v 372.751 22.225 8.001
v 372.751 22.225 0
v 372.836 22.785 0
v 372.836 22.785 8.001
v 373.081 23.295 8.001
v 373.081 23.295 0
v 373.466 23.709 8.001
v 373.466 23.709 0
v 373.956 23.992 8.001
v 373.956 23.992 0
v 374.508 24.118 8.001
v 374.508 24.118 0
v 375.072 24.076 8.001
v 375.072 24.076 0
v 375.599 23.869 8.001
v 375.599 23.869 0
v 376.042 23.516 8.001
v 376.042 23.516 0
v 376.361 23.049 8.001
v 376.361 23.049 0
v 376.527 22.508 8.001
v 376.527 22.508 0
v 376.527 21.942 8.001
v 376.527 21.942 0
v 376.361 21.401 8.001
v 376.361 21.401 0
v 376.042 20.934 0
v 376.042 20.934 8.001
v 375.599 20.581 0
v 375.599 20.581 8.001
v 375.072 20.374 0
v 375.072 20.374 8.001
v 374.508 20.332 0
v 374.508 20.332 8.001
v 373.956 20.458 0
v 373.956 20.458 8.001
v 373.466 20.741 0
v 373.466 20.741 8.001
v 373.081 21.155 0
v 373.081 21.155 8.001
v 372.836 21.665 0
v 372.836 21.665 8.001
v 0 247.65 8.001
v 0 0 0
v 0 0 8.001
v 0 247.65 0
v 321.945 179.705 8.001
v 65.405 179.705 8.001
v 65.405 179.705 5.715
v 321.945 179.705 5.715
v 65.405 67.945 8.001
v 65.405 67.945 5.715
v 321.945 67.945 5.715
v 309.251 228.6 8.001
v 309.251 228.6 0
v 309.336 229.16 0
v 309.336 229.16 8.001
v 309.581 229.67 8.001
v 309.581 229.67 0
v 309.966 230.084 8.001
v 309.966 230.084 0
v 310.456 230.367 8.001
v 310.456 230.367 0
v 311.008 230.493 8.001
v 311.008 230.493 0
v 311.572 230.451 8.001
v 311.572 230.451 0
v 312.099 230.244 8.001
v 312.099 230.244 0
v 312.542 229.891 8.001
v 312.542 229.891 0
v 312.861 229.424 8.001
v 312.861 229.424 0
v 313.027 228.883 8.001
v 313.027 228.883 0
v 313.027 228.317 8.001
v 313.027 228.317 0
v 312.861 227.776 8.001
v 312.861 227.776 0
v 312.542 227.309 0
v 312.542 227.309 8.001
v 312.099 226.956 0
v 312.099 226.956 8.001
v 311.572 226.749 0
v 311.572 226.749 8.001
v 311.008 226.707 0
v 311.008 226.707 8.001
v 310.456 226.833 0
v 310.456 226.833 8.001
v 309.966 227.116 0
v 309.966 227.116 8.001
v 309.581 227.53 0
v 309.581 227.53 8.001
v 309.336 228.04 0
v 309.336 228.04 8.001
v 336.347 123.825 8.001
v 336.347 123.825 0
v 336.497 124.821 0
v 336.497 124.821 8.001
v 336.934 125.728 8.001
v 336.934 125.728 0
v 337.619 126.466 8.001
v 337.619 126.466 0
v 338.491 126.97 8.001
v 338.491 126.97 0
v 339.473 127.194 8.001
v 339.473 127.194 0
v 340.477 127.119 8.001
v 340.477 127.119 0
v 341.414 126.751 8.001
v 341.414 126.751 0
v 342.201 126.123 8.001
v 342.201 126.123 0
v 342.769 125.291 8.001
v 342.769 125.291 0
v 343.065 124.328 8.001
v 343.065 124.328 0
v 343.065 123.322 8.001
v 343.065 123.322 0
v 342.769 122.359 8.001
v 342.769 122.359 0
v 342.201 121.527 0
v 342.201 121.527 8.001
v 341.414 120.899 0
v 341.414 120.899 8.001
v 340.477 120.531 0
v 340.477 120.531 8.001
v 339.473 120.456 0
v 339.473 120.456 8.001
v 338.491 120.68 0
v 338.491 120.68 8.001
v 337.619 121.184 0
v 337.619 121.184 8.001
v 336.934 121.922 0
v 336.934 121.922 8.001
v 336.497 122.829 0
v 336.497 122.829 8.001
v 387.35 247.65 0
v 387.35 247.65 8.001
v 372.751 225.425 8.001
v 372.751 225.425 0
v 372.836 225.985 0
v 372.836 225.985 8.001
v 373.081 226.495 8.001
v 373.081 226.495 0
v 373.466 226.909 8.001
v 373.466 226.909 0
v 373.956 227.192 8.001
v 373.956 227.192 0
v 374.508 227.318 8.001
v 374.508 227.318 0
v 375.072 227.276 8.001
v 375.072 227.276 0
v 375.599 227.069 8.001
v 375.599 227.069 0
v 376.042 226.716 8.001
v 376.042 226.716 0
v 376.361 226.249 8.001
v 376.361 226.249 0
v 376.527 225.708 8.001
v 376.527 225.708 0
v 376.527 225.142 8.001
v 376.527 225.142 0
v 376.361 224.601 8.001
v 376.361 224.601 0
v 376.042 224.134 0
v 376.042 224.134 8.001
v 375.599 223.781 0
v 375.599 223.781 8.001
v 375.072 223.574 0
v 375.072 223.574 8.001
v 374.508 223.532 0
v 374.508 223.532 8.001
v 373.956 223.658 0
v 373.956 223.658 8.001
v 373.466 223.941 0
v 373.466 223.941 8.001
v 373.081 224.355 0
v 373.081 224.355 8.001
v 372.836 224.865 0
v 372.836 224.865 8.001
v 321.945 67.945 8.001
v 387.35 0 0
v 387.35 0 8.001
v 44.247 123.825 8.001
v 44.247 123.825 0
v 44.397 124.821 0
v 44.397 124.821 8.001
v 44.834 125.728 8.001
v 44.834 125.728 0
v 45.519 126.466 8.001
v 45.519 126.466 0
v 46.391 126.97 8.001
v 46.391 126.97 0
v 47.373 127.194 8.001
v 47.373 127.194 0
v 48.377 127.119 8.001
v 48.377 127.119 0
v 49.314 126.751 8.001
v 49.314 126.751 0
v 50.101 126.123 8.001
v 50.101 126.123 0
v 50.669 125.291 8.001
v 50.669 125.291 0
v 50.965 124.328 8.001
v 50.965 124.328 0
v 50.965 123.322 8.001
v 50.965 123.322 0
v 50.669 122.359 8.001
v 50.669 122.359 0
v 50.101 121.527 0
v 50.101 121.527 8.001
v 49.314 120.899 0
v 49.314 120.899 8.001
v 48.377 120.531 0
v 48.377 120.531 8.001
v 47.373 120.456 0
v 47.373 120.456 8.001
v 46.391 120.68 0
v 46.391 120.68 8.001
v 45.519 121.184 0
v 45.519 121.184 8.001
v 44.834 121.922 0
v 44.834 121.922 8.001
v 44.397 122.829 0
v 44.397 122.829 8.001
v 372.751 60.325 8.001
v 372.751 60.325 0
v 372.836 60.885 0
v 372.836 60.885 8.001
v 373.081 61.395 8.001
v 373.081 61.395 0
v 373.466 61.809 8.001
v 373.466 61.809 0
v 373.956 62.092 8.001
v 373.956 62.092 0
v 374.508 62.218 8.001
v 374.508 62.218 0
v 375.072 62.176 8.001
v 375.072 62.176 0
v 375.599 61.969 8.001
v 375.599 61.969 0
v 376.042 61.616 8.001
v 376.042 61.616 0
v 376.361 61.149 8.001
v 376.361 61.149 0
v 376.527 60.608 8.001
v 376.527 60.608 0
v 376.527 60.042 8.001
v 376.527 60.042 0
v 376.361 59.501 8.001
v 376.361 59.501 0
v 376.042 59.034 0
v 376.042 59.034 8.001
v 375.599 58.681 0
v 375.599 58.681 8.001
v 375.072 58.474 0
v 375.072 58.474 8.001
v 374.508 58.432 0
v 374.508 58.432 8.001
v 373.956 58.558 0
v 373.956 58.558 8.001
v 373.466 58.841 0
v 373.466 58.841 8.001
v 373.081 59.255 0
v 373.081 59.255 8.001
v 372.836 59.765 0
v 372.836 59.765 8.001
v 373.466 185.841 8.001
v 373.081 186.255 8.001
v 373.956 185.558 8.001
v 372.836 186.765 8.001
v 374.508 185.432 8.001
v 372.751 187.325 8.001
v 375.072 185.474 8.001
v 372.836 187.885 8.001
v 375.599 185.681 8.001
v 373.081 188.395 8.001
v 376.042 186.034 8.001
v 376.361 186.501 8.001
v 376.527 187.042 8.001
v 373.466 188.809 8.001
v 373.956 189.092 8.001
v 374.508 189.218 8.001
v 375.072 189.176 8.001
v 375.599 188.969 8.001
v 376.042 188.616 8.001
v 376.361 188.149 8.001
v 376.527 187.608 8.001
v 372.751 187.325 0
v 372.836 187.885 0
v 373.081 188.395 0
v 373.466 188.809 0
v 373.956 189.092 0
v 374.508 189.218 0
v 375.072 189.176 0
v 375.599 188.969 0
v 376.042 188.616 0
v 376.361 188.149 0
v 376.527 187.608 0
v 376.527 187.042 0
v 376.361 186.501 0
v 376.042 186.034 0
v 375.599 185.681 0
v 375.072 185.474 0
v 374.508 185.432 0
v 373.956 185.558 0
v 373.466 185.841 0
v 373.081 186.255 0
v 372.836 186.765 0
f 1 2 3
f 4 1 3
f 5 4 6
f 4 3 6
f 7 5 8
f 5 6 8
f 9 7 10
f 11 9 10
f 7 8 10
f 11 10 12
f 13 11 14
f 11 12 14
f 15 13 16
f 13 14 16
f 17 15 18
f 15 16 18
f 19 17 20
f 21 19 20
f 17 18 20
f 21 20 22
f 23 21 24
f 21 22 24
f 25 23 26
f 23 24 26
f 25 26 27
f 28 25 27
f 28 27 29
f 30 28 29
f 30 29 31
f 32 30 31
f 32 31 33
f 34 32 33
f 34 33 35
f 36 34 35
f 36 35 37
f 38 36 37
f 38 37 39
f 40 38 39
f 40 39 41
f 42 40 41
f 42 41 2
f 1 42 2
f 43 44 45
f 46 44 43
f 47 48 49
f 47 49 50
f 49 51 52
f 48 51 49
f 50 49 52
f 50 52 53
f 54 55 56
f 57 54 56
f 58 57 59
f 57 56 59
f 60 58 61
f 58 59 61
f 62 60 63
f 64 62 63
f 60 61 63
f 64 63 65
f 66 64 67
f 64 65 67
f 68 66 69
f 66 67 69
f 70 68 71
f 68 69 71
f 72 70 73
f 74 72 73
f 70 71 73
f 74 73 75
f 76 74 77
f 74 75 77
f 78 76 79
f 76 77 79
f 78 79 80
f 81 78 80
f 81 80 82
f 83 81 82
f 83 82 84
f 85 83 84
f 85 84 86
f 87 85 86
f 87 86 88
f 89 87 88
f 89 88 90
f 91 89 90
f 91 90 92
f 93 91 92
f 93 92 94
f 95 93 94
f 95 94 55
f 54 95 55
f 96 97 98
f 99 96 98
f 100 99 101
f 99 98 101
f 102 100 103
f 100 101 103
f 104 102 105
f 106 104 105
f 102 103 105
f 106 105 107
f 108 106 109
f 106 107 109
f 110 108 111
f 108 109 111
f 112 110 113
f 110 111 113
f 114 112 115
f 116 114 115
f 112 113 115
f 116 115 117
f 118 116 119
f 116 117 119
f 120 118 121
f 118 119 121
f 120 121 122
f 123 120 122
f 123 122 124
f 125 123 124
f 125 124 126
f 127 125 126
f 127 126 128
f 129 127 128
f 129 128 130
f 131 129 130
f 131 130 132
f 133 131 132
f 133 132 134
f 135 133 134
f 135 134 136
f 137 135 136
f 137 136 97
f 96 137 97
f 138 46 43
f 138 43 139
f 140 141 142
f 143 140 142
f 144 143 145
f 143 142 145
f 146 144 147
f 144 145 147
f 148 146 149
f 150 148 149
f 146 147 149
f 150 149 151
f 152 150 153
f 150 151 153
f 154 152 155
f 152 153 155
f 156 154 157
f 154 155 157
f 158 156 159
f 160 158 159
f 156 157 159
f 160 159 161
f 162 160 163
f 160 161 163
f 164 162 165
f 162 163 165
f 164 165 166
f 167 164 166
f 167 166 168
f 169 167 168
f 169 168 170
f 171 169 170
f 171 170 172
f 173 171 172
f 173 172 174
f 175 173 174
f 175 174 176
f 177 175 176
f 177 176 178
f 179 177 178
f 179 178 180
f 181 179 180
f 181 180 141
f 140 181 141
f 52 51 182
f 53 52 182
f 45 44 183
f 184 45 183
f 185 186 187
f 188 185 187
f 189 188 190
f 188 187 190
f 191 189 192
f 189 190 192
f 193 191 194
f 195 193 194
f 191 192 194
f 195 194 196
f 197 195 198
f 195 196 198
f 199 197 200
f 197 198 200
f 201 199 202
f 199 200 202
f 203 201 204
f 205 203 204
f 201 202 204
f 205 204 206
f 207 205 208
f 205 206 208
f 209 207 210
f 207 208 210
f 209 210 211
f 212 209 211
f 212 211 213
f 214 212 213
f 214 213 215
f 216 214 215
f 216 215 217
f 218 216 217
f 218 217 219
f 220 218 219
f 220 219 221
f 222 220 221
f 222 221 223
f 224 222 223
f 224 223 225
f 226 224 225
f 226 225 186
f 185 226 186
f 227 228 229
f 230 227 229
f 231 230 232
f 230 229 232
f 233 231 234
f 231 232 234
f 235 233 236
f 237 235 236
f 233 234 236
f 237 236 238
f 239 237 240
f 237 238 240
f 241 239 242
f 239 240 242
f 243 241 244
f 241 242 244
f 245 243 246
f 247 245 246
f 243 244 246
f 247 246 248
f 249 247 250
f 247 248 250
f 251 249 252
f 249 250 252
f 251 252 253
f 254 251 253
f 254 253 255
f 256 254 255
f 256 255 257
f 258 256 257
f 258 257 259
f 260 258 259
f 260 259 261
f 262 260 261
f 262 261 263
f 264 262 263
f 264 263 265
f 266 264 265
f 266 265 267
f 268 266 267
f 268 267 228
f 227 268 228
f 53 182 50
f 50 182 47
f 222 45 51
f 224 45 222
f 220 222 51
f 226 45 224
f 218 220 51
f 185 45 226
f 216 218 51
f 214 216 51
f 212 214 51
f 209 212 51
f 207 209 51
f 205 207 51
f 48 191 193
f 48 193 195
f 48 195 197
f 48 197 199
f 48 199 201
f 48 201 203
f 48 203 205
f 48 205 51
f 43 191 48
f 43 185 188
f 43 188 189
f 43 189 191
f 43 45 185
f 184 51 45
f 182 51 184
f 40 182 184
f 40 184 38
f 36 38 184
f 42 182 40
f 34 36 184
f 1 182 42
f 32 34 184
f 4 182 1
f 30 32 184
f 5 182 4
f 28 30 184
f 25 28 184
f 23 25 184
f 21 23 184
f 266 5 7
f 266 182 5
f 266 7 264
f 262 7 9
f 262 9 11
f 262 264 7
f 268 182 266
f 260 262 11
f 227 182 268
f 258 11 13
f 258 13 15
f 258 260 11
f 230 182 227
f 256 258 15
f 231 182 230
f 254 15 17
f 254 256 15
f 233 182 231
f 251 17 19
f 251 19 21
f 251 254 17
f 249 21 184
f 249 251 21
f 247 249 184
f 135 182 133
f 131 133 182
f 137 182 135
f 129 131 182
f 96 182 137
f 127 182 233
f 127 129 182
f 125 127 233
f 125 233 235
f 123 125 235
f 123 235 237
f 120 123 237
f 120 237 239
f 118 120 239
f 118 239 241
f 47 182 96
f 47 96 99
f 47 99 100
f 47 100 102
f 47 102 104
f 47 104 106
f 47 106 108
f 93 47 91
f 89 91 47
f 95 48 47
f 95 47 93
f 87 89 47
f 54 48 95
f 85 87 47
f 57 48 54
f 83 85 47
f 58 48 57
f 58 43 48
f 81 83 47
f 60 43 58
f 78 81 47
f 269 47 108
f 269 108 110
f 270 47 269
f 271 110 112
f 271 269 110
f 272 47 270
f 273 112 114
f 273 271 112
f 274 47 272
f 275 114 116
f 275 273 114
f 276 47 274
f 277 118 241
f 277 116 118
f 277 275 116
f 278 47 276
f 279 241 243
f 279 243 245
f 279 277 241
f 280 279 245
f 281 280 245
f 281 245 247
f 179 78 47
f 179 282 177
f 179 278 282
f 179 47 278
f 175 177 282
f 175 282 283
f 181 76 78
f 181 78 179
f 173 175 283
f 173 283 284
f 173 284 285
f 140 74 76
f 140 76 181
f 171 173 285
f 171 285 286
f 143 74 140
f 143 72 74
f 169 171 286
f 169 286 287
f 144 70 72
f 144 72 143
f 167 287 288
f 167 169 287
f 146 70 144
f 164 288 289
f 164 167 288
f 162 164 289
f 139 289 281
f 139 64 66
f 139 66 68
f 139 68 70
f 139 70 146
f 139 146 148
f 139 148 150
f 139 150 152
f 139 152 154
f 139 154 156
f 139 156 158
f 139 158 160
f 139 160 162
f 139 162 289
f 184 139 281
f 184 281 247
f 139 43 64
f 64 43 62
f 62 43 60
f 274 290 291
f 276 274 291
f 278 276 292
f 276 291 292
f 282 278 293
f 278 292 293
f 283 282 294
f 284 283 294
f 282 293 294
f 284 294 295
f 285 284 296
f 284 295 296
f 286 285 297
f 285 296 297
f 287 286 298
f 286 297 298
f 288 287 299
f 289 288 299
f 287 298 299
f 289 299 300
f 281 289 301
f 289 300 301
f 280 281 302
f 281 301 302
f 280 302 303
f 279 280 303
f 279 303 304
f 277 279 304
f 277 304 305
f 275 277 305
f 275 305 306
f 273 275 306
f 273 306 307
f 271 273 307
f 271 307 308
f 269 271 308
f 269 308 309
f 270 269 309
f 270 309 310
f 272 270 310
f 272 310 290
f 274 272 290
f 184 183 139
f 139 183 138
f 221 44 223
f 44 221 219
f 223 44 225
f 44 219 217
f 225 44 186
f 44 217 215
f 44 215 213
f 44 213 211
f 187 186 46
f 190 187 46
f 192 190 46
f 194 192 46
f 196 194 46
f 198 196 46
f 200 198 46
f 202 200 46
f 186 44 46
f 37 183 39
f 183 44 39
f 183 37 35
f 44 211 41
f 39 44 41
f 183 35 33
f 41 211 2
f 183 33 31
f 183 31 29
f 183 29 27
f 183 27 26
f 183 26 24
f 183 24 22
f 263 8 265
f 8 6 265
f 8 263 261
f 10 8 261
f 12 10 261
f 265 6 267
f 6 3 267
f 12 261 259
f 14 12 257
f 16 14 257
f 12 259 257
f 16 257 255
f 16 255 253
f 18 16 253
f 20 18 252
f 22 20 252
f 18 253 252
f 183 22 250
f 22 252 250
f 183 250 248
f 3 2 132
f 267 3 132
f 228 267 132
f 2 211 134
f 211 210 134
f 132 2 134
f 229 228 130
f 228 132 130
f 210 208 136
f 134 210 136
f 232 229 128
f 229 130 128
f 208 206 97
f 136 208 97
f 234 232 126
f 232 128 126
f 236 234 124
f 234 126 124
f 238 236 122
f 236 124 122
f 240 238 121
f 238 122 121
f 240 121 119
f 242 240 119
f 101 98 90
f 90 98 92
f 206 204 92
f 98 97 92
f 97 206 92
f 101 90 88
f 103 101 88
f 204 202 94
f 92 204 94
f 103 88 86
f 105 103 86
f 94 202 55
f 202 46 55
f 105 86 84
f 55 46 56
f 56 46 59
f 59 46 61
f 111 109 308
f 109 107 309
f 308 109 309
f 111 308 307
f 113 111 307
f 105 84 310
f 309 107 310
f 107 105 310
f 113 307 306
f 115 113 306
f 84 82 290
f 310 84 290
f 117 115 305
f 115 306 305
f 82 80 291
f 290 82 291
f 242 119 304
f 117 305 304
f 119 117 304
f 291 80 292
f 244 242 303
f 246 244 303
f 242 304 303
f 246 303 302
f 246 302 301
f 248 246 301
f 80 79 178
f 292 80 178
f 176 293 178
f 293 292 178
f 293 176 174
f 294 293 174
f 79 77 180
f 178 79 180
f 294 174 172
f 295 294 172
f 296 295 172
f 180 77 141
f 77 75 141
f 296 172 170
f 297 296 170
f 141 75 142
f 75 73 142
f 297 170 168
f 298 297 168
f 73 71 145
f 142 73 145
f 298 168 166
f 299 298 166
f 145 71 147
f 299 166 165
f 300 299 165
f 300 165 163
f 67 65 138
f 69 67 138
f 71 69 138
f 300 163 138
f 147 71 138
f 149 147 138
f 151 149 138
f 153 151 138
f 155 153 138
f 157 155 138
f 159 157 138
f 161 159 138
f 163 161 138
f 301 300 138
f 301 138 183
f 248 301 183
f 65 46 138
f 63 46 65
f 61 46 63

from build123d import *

# Parameters (mm, degrees)
F0_W     = 387.35
F0_H     = 247.65
F1_DEPTH = 8.001
F3_D     = 3.7973
F5_D     = 6.7564
F6_W     = 256.54
F6_H     = 111.76
F7_DEPTH = 2.286
F9_D     = 3.7973


with BuildPart() as f1:
    # F0 (on Top) → F1 (new body)
    with BuildSketch(Plane.XY):
        with Locations((193.675, 123.825)):
            Rectangle(F0_W, F0_H)
    extrude(amount=F1_DEPTH)

    # F3 (through all)
    with Locations(Plane.XY.offset(8.001)):
        with Locations((374.65, 225.425), (374.65, 187.325), (374.65, 60.325), (374.65, 22.225)):
            Hole(F3_D / 2)

    # F5 (through all)
    with Locations(Plane.XY.offset(8.001)):
        with Locations((47.625, 123.825), (339.725, 123.825)):
            Hole(F5_D / 2)

    # F6 (on face) → F7 (cut)
    with BuildSketch(Plane.XY.offset(8.001)):
        with Locations((193.675, 123.825)):
            Rectangle(F6_W, F6_H)
    extrude(amount=-F7_DEPTH, mode=Mode.SUBTRACT)

    # F9 (through all)
    with Locations(Plane.XY.offset(8.001)):
        with Locations((311.15, 228.6)):
            Hole(F9_D / 2)


solid = f1.part
